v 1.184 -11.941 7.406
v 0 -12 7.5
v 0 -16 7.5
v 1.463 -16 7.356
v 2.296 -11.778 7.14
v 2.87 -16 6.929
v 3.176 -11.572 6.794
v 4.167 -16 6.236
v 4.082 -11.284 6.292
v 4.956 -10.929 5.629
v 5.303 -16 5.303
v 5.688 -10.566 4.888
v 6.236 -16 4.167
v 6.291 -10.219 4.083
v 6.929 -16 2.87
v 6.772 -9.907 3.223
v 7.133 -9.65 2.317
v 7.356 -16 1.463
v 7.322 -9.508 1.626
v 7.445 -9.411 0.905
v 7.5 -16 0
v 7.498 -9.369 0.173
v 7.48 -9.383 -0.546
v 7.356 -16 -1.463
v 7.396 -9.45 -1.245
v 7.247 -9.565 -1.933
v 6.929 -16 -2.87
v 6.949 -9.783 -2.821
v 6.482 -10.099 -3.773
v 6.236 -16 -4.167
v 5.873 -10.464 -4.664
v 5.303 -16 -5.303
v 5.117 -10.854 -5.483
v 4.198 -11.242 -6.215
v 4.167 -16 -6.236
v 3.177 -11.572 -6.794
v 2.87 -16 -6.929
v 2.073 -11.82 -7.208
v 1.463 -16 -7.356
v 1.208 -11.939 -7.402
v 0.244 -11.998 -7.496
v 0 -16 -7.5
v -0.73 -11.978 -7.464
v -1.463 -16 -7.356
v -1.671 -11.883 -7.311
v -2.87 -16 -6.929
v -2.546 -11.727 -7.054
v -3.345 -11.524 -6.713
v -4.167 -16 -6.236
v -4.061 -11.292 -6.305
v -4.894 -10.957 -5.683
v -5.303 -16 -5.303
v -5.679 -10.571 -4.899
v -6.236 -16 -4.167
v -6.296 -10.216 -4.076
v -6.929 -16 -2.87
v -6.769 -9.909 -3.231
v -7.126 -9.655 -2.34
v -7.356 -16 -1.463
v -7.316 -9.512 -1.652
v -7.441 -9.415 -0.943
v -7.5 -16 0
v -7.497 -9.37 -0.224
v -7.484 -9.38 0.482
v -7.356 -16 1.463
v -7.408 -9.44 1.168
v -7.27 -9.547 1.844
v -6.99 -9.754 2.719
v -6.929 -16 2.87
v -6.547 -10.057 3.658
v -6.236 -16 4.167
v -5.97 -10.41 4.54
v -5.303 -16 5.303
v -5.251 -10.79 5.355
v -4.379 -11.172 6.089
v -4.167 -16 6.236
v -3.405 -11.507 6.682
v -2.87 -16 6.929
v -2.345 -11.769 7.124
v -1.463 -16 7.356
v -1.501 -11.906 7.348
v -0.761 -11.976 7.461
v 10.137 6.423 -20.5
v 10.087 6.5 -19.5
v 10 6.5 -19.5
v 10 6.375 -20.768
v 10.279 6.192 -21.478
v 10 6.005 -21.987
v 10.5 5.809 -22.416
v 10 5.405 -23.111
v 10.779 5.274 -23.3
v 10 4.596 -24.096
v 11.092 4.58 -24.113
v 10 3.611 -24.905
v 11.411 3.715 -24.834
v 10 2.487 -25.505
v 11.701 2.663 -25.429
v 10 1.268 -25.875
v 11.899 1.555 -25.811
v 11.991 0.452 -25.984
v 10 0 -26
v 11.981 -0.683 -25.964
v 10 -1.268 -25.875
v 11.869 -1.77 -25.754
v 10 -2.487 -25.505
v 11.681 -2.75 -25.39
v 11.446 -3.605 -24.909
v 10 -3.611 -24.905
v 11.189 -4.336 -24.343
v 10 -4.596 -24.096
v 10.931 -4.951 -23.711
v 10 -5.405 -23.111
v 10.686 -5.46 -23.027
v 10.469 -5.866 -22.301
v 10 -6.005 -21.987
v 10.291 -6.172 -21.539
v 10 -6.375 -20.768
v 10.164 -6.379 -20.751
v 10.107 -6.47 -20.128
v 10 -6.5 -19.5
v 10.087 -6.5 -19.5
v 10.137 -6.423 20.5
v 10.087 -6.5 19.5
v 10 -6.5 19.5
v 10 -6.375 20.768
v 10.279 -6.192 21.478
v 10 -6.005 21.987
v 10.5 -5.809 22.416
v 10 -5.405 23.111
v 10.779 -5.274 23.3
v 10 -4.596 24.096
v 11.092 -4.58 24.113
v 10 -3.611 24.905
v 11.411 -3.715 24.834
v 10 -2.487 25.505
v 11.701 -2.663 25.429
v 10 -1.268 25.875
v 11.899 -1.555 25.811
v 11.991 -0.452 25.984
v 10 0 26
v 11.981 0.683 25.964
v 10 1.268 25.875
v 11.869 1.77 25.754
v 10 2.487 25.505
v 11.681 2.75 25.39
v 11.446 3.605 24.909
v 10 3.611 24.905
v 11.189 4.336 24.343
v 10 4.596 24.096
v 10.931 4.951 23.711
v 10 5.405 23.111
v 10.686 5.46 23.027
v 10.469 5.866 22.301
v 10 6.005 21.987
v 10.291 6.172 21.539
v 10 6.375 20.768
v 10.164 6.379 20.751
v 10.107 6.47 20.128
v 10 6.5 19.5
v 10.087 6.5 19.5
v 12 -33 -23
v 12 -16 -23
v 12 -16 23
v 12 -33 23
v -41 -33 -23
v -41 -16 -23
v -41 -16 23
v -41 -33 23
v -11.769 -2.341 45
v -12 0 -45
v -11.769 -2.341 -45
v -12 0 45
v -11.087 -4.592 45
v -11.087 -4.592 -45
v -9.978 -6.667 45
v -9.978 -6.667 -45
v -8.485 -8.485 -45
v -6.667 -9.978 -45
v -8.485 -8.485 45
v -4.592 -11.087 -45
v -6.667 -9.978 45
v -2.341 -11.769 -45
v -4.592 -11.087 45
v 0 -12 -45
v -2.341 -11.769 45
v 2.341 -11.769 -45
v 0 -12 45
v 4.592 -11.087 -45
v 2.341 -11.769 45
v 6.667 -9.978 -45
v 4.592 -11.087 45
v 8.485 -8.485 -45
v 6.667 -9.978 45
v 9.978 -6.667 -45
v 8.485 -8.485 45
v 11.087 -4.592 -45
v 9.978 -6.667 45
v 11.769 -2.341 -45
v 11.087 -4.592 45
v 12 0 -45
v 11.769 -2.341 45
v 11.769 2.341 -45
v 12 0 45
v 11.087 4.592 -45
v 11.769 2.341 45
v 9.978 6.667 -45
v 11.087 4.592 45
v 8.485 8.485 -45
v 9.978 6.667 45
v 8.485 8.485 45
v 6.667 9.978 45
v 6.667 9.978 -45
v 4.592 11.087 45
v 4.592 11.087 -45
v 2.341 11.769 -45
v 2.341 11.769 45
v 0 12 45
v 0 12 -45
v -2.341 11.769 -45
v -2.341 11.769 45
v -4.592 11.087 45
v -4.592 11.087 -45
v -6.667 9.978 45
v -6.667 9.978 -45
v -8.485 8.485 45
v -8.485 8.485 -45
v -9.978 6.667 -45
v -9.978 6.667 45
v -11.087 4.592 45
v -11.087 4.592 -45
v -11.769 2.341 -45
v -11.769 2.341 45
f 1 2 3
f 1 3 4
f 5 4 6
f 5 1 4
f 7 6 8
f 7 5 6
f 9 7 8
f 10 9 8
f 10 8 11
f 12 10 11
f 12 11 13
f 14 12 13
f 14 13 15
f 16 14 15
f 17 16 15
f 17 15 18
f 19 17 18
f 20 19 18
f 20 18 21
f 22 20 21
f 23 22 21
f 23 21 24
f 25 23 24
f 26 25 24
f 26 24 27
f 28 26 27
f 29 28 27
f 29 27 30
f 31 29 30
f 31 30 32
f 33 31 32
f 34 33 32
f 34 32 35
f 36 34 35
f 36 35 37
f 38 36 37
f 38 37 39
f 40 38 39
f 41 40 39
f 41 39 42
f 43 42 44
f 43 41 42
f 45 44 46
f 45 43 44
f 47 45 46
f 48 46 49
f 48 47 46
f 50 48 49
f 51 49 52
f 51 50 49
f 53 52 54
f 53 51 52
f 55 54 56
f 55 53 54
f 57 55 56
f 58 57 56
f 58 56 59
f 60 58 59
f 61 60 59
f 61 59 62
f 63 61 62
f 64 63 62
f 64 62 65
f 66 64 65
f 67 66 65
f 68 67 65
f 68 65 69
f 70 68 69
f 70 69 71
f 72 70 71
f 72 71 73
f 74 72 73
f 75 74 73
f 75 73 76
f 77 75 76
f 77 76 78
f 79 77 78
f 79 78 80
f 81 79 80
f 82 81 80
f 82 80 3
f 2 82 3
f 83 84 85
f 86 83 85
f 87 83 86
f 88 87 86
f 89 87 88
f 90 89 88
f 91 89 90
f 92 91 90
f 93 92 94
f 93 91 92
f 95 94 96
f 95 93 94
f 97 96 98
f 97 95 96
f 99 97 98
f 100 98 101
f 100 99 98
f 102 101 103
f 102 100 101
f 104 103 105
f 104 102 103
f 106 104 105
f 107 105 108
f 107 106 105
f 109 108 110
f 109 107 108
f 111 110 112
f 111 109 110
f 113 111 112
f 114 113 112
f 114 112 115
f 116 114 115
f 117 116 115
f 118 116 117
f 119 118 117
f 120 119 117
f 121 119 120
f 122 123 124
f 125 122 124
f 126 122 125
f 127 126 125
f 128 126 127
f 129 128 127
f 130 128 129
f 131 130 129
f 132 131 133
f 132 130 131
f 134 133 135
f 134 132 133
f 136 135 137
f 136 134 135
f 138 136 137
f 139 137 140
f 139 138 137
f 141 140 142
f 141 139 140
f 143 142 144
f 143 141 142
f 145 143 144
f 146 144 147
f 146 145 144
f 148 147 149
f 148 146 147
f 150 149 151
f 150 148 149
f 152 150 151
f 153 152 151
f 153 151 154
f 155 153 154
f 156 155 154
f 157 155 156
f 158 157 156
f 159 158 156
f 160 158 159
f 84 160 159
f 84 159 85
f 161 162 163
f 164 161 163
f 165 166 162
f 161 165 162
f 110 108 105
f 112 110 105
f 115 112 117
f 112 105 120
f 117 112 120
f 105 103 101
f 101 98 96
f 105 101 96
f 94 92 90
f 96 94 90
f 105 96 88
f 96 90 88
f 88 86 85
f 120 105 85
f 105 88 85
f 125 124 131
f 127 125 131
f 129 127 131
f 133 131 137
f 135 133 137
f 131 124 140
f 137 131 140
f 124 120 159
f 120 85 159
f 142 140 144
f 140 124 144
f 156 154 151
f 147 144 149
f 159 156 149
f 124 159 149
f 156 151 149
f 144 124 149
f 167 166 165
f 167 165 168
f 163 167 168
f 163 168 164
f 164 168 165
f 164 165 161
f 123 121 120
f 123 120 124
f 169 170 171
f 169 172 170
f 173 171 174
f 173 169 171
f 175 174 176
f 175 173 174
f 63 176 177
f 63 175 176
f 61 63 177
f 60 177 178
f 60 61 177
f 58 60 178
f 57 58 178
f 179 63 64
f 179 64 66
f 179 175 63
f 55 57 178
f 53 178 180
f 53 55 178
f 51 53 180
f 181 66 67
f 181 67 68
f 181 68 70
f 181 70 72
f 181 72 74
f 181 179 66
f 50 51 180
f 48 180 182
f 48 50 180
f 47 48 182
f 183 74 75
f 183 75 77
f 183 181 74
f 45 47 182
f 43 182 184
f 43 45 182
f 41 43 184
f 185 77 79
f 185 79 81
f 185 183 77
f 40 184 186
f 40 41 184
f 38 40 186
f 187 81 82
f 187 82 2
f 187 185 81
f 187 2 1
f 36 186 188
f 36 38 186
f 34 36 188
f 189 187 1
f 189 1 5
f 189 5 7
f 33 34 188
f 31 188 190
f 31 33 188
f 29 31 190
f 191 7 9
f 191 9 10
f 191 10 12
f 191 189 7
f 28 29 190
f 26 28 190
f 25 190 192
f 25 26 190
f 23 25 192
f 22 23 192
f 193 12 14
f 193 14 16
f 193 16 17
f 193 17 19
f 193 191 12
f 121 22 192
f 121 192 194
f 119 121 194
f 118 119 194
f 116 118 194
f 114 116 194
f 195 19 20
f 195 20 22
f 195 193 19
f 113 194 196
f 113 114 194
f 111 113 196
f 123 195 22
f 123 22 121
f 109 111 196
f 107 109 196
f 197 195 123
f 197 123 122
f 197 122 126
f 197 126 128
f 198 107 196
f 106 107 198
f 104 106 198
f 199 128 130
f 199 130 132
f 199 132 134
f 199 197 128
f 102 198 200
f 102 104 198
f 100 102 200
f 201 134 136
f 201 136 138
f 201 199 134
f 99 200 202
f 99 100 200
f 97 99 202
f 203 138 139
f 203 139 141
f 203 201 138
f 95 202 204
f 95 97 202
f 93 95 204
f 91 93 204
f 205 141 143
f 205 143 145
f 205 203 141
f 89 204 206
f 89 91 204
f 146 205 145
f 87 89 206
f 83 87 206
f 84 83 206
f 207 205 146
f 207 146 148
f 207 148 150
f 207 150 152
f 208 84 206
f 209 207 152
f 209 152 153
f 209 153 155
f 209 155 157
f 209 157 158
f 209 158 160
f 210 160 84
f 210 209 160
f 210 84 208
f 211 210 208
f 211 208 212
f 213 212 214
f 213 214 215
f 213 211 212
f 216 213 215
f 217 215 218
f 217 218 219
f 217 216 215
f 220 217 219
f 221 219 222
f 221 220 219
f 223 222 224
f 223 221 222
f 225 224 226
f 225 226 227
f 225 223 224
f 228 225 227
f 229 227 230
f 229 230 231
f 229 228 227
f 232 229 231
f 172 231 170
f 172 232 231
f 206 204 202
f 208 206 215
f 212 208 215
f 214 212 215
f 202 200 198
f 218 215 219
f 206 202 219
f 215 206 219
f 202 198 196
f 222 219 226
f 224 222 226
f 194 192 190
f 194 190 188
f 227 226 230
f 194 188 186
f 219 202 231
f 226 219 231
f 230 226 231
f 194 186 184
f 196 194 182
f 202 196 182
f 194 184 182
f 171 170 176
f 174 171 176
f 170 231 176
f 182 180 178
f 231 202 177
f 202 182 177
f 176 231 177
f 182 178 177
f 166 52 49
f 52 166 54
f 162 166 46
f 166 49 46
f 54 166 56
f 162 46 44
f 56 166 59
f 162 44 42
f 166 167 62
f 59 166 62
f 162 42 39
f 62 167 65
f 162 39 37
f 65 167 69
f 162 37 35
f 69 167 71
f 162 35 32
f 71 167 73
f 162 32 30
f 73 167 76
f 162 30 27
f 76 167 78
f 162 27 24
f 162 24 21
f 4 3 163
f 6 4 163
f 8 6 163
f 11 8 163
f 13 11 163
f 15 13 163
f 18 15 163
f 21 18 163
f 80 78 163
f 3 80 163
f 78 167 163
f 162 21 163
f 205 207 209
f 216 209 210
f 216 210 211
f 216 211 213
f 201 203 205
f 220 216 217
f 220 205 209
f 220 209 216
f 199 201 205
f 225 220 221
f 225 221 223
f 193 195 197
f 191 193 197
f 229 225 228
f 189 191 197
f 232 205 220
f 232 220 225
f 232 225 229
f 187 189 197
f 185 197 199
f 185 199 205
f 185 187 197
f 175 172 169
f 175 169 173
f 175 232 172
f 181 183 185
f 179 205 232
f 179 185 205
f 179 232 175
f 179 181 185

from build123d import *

# Parameters (mm, degrees)
SKETCH1_R           = 12
BOSS_EXTRUDE1_DEPTH = 45
SKETCH2_R           = 7.5
BOSS_EXTRUDE2_DEPTH = 16
SKETCH3_W           = 53
SKETCH3_H           = 46
BOSS_EXTRUDE3_DEPTH = 17
CUT_EXTRUDE1_DEPTH  = 2


with BuildPart() as part:
    # Sketch1 → Boss-Extrude1 (new, symmetric)
    with BuildSketch(Plane.XY):
        with Locations(Location((0, 0, 0), (0, 0, 180))):
            Circle(SKETCH1_R)
    extrude(amount=BOSS_EXTRUDE1_DEPTH, both=True)

    # Sketch2 → Boss-Extrude2 (add)
    with BuildSketch(Plane(origin=(0, 0, 0), x_dir=(1, 0, 0), z_dir=(0, 1, 0))):
        with Locations(Location((0, 0, 0), (0, 0, 270))):
            Circle(SKETCH2_R)
    extrude(amount=-BOSS_EXTRUDE2_DEPTH)

    # Sketch3 → Boss-Extrude3 (add)
    with BuildSketch(Plane.XZ.offset(16)):
        with Locations((-14.5, 0)):
            Rectangle(SKETCH3_W, SKETCH3_H)
    extrude(amount=BOSS_EXTRUDE3_DEPTH)

    # Sketch4 → Cut-Extrude1 (cut)
    with BuildSketch(Plane(origin=(12, 0, 0), x_dir=(0, 0, -1), z_dir=(1, 0, 0))):
        with BuildLine():
            Line((-19.5, 6.5), (19.5, 6.5))
            ThreePointArc((19.5, 6.5), (26, 0), (19.5, -6.5))
            Line((19.5, -6.5), (-19.5, -6.5))
            ThreePointArc((-19.5, -6.5), (-26, 0), (-19.5, 6.5))
        make_face()
    extrude(amount=-CUT_EXTRUDE1_DEPTH, mode=Mode.SUBTRACT)


solid = part.part
